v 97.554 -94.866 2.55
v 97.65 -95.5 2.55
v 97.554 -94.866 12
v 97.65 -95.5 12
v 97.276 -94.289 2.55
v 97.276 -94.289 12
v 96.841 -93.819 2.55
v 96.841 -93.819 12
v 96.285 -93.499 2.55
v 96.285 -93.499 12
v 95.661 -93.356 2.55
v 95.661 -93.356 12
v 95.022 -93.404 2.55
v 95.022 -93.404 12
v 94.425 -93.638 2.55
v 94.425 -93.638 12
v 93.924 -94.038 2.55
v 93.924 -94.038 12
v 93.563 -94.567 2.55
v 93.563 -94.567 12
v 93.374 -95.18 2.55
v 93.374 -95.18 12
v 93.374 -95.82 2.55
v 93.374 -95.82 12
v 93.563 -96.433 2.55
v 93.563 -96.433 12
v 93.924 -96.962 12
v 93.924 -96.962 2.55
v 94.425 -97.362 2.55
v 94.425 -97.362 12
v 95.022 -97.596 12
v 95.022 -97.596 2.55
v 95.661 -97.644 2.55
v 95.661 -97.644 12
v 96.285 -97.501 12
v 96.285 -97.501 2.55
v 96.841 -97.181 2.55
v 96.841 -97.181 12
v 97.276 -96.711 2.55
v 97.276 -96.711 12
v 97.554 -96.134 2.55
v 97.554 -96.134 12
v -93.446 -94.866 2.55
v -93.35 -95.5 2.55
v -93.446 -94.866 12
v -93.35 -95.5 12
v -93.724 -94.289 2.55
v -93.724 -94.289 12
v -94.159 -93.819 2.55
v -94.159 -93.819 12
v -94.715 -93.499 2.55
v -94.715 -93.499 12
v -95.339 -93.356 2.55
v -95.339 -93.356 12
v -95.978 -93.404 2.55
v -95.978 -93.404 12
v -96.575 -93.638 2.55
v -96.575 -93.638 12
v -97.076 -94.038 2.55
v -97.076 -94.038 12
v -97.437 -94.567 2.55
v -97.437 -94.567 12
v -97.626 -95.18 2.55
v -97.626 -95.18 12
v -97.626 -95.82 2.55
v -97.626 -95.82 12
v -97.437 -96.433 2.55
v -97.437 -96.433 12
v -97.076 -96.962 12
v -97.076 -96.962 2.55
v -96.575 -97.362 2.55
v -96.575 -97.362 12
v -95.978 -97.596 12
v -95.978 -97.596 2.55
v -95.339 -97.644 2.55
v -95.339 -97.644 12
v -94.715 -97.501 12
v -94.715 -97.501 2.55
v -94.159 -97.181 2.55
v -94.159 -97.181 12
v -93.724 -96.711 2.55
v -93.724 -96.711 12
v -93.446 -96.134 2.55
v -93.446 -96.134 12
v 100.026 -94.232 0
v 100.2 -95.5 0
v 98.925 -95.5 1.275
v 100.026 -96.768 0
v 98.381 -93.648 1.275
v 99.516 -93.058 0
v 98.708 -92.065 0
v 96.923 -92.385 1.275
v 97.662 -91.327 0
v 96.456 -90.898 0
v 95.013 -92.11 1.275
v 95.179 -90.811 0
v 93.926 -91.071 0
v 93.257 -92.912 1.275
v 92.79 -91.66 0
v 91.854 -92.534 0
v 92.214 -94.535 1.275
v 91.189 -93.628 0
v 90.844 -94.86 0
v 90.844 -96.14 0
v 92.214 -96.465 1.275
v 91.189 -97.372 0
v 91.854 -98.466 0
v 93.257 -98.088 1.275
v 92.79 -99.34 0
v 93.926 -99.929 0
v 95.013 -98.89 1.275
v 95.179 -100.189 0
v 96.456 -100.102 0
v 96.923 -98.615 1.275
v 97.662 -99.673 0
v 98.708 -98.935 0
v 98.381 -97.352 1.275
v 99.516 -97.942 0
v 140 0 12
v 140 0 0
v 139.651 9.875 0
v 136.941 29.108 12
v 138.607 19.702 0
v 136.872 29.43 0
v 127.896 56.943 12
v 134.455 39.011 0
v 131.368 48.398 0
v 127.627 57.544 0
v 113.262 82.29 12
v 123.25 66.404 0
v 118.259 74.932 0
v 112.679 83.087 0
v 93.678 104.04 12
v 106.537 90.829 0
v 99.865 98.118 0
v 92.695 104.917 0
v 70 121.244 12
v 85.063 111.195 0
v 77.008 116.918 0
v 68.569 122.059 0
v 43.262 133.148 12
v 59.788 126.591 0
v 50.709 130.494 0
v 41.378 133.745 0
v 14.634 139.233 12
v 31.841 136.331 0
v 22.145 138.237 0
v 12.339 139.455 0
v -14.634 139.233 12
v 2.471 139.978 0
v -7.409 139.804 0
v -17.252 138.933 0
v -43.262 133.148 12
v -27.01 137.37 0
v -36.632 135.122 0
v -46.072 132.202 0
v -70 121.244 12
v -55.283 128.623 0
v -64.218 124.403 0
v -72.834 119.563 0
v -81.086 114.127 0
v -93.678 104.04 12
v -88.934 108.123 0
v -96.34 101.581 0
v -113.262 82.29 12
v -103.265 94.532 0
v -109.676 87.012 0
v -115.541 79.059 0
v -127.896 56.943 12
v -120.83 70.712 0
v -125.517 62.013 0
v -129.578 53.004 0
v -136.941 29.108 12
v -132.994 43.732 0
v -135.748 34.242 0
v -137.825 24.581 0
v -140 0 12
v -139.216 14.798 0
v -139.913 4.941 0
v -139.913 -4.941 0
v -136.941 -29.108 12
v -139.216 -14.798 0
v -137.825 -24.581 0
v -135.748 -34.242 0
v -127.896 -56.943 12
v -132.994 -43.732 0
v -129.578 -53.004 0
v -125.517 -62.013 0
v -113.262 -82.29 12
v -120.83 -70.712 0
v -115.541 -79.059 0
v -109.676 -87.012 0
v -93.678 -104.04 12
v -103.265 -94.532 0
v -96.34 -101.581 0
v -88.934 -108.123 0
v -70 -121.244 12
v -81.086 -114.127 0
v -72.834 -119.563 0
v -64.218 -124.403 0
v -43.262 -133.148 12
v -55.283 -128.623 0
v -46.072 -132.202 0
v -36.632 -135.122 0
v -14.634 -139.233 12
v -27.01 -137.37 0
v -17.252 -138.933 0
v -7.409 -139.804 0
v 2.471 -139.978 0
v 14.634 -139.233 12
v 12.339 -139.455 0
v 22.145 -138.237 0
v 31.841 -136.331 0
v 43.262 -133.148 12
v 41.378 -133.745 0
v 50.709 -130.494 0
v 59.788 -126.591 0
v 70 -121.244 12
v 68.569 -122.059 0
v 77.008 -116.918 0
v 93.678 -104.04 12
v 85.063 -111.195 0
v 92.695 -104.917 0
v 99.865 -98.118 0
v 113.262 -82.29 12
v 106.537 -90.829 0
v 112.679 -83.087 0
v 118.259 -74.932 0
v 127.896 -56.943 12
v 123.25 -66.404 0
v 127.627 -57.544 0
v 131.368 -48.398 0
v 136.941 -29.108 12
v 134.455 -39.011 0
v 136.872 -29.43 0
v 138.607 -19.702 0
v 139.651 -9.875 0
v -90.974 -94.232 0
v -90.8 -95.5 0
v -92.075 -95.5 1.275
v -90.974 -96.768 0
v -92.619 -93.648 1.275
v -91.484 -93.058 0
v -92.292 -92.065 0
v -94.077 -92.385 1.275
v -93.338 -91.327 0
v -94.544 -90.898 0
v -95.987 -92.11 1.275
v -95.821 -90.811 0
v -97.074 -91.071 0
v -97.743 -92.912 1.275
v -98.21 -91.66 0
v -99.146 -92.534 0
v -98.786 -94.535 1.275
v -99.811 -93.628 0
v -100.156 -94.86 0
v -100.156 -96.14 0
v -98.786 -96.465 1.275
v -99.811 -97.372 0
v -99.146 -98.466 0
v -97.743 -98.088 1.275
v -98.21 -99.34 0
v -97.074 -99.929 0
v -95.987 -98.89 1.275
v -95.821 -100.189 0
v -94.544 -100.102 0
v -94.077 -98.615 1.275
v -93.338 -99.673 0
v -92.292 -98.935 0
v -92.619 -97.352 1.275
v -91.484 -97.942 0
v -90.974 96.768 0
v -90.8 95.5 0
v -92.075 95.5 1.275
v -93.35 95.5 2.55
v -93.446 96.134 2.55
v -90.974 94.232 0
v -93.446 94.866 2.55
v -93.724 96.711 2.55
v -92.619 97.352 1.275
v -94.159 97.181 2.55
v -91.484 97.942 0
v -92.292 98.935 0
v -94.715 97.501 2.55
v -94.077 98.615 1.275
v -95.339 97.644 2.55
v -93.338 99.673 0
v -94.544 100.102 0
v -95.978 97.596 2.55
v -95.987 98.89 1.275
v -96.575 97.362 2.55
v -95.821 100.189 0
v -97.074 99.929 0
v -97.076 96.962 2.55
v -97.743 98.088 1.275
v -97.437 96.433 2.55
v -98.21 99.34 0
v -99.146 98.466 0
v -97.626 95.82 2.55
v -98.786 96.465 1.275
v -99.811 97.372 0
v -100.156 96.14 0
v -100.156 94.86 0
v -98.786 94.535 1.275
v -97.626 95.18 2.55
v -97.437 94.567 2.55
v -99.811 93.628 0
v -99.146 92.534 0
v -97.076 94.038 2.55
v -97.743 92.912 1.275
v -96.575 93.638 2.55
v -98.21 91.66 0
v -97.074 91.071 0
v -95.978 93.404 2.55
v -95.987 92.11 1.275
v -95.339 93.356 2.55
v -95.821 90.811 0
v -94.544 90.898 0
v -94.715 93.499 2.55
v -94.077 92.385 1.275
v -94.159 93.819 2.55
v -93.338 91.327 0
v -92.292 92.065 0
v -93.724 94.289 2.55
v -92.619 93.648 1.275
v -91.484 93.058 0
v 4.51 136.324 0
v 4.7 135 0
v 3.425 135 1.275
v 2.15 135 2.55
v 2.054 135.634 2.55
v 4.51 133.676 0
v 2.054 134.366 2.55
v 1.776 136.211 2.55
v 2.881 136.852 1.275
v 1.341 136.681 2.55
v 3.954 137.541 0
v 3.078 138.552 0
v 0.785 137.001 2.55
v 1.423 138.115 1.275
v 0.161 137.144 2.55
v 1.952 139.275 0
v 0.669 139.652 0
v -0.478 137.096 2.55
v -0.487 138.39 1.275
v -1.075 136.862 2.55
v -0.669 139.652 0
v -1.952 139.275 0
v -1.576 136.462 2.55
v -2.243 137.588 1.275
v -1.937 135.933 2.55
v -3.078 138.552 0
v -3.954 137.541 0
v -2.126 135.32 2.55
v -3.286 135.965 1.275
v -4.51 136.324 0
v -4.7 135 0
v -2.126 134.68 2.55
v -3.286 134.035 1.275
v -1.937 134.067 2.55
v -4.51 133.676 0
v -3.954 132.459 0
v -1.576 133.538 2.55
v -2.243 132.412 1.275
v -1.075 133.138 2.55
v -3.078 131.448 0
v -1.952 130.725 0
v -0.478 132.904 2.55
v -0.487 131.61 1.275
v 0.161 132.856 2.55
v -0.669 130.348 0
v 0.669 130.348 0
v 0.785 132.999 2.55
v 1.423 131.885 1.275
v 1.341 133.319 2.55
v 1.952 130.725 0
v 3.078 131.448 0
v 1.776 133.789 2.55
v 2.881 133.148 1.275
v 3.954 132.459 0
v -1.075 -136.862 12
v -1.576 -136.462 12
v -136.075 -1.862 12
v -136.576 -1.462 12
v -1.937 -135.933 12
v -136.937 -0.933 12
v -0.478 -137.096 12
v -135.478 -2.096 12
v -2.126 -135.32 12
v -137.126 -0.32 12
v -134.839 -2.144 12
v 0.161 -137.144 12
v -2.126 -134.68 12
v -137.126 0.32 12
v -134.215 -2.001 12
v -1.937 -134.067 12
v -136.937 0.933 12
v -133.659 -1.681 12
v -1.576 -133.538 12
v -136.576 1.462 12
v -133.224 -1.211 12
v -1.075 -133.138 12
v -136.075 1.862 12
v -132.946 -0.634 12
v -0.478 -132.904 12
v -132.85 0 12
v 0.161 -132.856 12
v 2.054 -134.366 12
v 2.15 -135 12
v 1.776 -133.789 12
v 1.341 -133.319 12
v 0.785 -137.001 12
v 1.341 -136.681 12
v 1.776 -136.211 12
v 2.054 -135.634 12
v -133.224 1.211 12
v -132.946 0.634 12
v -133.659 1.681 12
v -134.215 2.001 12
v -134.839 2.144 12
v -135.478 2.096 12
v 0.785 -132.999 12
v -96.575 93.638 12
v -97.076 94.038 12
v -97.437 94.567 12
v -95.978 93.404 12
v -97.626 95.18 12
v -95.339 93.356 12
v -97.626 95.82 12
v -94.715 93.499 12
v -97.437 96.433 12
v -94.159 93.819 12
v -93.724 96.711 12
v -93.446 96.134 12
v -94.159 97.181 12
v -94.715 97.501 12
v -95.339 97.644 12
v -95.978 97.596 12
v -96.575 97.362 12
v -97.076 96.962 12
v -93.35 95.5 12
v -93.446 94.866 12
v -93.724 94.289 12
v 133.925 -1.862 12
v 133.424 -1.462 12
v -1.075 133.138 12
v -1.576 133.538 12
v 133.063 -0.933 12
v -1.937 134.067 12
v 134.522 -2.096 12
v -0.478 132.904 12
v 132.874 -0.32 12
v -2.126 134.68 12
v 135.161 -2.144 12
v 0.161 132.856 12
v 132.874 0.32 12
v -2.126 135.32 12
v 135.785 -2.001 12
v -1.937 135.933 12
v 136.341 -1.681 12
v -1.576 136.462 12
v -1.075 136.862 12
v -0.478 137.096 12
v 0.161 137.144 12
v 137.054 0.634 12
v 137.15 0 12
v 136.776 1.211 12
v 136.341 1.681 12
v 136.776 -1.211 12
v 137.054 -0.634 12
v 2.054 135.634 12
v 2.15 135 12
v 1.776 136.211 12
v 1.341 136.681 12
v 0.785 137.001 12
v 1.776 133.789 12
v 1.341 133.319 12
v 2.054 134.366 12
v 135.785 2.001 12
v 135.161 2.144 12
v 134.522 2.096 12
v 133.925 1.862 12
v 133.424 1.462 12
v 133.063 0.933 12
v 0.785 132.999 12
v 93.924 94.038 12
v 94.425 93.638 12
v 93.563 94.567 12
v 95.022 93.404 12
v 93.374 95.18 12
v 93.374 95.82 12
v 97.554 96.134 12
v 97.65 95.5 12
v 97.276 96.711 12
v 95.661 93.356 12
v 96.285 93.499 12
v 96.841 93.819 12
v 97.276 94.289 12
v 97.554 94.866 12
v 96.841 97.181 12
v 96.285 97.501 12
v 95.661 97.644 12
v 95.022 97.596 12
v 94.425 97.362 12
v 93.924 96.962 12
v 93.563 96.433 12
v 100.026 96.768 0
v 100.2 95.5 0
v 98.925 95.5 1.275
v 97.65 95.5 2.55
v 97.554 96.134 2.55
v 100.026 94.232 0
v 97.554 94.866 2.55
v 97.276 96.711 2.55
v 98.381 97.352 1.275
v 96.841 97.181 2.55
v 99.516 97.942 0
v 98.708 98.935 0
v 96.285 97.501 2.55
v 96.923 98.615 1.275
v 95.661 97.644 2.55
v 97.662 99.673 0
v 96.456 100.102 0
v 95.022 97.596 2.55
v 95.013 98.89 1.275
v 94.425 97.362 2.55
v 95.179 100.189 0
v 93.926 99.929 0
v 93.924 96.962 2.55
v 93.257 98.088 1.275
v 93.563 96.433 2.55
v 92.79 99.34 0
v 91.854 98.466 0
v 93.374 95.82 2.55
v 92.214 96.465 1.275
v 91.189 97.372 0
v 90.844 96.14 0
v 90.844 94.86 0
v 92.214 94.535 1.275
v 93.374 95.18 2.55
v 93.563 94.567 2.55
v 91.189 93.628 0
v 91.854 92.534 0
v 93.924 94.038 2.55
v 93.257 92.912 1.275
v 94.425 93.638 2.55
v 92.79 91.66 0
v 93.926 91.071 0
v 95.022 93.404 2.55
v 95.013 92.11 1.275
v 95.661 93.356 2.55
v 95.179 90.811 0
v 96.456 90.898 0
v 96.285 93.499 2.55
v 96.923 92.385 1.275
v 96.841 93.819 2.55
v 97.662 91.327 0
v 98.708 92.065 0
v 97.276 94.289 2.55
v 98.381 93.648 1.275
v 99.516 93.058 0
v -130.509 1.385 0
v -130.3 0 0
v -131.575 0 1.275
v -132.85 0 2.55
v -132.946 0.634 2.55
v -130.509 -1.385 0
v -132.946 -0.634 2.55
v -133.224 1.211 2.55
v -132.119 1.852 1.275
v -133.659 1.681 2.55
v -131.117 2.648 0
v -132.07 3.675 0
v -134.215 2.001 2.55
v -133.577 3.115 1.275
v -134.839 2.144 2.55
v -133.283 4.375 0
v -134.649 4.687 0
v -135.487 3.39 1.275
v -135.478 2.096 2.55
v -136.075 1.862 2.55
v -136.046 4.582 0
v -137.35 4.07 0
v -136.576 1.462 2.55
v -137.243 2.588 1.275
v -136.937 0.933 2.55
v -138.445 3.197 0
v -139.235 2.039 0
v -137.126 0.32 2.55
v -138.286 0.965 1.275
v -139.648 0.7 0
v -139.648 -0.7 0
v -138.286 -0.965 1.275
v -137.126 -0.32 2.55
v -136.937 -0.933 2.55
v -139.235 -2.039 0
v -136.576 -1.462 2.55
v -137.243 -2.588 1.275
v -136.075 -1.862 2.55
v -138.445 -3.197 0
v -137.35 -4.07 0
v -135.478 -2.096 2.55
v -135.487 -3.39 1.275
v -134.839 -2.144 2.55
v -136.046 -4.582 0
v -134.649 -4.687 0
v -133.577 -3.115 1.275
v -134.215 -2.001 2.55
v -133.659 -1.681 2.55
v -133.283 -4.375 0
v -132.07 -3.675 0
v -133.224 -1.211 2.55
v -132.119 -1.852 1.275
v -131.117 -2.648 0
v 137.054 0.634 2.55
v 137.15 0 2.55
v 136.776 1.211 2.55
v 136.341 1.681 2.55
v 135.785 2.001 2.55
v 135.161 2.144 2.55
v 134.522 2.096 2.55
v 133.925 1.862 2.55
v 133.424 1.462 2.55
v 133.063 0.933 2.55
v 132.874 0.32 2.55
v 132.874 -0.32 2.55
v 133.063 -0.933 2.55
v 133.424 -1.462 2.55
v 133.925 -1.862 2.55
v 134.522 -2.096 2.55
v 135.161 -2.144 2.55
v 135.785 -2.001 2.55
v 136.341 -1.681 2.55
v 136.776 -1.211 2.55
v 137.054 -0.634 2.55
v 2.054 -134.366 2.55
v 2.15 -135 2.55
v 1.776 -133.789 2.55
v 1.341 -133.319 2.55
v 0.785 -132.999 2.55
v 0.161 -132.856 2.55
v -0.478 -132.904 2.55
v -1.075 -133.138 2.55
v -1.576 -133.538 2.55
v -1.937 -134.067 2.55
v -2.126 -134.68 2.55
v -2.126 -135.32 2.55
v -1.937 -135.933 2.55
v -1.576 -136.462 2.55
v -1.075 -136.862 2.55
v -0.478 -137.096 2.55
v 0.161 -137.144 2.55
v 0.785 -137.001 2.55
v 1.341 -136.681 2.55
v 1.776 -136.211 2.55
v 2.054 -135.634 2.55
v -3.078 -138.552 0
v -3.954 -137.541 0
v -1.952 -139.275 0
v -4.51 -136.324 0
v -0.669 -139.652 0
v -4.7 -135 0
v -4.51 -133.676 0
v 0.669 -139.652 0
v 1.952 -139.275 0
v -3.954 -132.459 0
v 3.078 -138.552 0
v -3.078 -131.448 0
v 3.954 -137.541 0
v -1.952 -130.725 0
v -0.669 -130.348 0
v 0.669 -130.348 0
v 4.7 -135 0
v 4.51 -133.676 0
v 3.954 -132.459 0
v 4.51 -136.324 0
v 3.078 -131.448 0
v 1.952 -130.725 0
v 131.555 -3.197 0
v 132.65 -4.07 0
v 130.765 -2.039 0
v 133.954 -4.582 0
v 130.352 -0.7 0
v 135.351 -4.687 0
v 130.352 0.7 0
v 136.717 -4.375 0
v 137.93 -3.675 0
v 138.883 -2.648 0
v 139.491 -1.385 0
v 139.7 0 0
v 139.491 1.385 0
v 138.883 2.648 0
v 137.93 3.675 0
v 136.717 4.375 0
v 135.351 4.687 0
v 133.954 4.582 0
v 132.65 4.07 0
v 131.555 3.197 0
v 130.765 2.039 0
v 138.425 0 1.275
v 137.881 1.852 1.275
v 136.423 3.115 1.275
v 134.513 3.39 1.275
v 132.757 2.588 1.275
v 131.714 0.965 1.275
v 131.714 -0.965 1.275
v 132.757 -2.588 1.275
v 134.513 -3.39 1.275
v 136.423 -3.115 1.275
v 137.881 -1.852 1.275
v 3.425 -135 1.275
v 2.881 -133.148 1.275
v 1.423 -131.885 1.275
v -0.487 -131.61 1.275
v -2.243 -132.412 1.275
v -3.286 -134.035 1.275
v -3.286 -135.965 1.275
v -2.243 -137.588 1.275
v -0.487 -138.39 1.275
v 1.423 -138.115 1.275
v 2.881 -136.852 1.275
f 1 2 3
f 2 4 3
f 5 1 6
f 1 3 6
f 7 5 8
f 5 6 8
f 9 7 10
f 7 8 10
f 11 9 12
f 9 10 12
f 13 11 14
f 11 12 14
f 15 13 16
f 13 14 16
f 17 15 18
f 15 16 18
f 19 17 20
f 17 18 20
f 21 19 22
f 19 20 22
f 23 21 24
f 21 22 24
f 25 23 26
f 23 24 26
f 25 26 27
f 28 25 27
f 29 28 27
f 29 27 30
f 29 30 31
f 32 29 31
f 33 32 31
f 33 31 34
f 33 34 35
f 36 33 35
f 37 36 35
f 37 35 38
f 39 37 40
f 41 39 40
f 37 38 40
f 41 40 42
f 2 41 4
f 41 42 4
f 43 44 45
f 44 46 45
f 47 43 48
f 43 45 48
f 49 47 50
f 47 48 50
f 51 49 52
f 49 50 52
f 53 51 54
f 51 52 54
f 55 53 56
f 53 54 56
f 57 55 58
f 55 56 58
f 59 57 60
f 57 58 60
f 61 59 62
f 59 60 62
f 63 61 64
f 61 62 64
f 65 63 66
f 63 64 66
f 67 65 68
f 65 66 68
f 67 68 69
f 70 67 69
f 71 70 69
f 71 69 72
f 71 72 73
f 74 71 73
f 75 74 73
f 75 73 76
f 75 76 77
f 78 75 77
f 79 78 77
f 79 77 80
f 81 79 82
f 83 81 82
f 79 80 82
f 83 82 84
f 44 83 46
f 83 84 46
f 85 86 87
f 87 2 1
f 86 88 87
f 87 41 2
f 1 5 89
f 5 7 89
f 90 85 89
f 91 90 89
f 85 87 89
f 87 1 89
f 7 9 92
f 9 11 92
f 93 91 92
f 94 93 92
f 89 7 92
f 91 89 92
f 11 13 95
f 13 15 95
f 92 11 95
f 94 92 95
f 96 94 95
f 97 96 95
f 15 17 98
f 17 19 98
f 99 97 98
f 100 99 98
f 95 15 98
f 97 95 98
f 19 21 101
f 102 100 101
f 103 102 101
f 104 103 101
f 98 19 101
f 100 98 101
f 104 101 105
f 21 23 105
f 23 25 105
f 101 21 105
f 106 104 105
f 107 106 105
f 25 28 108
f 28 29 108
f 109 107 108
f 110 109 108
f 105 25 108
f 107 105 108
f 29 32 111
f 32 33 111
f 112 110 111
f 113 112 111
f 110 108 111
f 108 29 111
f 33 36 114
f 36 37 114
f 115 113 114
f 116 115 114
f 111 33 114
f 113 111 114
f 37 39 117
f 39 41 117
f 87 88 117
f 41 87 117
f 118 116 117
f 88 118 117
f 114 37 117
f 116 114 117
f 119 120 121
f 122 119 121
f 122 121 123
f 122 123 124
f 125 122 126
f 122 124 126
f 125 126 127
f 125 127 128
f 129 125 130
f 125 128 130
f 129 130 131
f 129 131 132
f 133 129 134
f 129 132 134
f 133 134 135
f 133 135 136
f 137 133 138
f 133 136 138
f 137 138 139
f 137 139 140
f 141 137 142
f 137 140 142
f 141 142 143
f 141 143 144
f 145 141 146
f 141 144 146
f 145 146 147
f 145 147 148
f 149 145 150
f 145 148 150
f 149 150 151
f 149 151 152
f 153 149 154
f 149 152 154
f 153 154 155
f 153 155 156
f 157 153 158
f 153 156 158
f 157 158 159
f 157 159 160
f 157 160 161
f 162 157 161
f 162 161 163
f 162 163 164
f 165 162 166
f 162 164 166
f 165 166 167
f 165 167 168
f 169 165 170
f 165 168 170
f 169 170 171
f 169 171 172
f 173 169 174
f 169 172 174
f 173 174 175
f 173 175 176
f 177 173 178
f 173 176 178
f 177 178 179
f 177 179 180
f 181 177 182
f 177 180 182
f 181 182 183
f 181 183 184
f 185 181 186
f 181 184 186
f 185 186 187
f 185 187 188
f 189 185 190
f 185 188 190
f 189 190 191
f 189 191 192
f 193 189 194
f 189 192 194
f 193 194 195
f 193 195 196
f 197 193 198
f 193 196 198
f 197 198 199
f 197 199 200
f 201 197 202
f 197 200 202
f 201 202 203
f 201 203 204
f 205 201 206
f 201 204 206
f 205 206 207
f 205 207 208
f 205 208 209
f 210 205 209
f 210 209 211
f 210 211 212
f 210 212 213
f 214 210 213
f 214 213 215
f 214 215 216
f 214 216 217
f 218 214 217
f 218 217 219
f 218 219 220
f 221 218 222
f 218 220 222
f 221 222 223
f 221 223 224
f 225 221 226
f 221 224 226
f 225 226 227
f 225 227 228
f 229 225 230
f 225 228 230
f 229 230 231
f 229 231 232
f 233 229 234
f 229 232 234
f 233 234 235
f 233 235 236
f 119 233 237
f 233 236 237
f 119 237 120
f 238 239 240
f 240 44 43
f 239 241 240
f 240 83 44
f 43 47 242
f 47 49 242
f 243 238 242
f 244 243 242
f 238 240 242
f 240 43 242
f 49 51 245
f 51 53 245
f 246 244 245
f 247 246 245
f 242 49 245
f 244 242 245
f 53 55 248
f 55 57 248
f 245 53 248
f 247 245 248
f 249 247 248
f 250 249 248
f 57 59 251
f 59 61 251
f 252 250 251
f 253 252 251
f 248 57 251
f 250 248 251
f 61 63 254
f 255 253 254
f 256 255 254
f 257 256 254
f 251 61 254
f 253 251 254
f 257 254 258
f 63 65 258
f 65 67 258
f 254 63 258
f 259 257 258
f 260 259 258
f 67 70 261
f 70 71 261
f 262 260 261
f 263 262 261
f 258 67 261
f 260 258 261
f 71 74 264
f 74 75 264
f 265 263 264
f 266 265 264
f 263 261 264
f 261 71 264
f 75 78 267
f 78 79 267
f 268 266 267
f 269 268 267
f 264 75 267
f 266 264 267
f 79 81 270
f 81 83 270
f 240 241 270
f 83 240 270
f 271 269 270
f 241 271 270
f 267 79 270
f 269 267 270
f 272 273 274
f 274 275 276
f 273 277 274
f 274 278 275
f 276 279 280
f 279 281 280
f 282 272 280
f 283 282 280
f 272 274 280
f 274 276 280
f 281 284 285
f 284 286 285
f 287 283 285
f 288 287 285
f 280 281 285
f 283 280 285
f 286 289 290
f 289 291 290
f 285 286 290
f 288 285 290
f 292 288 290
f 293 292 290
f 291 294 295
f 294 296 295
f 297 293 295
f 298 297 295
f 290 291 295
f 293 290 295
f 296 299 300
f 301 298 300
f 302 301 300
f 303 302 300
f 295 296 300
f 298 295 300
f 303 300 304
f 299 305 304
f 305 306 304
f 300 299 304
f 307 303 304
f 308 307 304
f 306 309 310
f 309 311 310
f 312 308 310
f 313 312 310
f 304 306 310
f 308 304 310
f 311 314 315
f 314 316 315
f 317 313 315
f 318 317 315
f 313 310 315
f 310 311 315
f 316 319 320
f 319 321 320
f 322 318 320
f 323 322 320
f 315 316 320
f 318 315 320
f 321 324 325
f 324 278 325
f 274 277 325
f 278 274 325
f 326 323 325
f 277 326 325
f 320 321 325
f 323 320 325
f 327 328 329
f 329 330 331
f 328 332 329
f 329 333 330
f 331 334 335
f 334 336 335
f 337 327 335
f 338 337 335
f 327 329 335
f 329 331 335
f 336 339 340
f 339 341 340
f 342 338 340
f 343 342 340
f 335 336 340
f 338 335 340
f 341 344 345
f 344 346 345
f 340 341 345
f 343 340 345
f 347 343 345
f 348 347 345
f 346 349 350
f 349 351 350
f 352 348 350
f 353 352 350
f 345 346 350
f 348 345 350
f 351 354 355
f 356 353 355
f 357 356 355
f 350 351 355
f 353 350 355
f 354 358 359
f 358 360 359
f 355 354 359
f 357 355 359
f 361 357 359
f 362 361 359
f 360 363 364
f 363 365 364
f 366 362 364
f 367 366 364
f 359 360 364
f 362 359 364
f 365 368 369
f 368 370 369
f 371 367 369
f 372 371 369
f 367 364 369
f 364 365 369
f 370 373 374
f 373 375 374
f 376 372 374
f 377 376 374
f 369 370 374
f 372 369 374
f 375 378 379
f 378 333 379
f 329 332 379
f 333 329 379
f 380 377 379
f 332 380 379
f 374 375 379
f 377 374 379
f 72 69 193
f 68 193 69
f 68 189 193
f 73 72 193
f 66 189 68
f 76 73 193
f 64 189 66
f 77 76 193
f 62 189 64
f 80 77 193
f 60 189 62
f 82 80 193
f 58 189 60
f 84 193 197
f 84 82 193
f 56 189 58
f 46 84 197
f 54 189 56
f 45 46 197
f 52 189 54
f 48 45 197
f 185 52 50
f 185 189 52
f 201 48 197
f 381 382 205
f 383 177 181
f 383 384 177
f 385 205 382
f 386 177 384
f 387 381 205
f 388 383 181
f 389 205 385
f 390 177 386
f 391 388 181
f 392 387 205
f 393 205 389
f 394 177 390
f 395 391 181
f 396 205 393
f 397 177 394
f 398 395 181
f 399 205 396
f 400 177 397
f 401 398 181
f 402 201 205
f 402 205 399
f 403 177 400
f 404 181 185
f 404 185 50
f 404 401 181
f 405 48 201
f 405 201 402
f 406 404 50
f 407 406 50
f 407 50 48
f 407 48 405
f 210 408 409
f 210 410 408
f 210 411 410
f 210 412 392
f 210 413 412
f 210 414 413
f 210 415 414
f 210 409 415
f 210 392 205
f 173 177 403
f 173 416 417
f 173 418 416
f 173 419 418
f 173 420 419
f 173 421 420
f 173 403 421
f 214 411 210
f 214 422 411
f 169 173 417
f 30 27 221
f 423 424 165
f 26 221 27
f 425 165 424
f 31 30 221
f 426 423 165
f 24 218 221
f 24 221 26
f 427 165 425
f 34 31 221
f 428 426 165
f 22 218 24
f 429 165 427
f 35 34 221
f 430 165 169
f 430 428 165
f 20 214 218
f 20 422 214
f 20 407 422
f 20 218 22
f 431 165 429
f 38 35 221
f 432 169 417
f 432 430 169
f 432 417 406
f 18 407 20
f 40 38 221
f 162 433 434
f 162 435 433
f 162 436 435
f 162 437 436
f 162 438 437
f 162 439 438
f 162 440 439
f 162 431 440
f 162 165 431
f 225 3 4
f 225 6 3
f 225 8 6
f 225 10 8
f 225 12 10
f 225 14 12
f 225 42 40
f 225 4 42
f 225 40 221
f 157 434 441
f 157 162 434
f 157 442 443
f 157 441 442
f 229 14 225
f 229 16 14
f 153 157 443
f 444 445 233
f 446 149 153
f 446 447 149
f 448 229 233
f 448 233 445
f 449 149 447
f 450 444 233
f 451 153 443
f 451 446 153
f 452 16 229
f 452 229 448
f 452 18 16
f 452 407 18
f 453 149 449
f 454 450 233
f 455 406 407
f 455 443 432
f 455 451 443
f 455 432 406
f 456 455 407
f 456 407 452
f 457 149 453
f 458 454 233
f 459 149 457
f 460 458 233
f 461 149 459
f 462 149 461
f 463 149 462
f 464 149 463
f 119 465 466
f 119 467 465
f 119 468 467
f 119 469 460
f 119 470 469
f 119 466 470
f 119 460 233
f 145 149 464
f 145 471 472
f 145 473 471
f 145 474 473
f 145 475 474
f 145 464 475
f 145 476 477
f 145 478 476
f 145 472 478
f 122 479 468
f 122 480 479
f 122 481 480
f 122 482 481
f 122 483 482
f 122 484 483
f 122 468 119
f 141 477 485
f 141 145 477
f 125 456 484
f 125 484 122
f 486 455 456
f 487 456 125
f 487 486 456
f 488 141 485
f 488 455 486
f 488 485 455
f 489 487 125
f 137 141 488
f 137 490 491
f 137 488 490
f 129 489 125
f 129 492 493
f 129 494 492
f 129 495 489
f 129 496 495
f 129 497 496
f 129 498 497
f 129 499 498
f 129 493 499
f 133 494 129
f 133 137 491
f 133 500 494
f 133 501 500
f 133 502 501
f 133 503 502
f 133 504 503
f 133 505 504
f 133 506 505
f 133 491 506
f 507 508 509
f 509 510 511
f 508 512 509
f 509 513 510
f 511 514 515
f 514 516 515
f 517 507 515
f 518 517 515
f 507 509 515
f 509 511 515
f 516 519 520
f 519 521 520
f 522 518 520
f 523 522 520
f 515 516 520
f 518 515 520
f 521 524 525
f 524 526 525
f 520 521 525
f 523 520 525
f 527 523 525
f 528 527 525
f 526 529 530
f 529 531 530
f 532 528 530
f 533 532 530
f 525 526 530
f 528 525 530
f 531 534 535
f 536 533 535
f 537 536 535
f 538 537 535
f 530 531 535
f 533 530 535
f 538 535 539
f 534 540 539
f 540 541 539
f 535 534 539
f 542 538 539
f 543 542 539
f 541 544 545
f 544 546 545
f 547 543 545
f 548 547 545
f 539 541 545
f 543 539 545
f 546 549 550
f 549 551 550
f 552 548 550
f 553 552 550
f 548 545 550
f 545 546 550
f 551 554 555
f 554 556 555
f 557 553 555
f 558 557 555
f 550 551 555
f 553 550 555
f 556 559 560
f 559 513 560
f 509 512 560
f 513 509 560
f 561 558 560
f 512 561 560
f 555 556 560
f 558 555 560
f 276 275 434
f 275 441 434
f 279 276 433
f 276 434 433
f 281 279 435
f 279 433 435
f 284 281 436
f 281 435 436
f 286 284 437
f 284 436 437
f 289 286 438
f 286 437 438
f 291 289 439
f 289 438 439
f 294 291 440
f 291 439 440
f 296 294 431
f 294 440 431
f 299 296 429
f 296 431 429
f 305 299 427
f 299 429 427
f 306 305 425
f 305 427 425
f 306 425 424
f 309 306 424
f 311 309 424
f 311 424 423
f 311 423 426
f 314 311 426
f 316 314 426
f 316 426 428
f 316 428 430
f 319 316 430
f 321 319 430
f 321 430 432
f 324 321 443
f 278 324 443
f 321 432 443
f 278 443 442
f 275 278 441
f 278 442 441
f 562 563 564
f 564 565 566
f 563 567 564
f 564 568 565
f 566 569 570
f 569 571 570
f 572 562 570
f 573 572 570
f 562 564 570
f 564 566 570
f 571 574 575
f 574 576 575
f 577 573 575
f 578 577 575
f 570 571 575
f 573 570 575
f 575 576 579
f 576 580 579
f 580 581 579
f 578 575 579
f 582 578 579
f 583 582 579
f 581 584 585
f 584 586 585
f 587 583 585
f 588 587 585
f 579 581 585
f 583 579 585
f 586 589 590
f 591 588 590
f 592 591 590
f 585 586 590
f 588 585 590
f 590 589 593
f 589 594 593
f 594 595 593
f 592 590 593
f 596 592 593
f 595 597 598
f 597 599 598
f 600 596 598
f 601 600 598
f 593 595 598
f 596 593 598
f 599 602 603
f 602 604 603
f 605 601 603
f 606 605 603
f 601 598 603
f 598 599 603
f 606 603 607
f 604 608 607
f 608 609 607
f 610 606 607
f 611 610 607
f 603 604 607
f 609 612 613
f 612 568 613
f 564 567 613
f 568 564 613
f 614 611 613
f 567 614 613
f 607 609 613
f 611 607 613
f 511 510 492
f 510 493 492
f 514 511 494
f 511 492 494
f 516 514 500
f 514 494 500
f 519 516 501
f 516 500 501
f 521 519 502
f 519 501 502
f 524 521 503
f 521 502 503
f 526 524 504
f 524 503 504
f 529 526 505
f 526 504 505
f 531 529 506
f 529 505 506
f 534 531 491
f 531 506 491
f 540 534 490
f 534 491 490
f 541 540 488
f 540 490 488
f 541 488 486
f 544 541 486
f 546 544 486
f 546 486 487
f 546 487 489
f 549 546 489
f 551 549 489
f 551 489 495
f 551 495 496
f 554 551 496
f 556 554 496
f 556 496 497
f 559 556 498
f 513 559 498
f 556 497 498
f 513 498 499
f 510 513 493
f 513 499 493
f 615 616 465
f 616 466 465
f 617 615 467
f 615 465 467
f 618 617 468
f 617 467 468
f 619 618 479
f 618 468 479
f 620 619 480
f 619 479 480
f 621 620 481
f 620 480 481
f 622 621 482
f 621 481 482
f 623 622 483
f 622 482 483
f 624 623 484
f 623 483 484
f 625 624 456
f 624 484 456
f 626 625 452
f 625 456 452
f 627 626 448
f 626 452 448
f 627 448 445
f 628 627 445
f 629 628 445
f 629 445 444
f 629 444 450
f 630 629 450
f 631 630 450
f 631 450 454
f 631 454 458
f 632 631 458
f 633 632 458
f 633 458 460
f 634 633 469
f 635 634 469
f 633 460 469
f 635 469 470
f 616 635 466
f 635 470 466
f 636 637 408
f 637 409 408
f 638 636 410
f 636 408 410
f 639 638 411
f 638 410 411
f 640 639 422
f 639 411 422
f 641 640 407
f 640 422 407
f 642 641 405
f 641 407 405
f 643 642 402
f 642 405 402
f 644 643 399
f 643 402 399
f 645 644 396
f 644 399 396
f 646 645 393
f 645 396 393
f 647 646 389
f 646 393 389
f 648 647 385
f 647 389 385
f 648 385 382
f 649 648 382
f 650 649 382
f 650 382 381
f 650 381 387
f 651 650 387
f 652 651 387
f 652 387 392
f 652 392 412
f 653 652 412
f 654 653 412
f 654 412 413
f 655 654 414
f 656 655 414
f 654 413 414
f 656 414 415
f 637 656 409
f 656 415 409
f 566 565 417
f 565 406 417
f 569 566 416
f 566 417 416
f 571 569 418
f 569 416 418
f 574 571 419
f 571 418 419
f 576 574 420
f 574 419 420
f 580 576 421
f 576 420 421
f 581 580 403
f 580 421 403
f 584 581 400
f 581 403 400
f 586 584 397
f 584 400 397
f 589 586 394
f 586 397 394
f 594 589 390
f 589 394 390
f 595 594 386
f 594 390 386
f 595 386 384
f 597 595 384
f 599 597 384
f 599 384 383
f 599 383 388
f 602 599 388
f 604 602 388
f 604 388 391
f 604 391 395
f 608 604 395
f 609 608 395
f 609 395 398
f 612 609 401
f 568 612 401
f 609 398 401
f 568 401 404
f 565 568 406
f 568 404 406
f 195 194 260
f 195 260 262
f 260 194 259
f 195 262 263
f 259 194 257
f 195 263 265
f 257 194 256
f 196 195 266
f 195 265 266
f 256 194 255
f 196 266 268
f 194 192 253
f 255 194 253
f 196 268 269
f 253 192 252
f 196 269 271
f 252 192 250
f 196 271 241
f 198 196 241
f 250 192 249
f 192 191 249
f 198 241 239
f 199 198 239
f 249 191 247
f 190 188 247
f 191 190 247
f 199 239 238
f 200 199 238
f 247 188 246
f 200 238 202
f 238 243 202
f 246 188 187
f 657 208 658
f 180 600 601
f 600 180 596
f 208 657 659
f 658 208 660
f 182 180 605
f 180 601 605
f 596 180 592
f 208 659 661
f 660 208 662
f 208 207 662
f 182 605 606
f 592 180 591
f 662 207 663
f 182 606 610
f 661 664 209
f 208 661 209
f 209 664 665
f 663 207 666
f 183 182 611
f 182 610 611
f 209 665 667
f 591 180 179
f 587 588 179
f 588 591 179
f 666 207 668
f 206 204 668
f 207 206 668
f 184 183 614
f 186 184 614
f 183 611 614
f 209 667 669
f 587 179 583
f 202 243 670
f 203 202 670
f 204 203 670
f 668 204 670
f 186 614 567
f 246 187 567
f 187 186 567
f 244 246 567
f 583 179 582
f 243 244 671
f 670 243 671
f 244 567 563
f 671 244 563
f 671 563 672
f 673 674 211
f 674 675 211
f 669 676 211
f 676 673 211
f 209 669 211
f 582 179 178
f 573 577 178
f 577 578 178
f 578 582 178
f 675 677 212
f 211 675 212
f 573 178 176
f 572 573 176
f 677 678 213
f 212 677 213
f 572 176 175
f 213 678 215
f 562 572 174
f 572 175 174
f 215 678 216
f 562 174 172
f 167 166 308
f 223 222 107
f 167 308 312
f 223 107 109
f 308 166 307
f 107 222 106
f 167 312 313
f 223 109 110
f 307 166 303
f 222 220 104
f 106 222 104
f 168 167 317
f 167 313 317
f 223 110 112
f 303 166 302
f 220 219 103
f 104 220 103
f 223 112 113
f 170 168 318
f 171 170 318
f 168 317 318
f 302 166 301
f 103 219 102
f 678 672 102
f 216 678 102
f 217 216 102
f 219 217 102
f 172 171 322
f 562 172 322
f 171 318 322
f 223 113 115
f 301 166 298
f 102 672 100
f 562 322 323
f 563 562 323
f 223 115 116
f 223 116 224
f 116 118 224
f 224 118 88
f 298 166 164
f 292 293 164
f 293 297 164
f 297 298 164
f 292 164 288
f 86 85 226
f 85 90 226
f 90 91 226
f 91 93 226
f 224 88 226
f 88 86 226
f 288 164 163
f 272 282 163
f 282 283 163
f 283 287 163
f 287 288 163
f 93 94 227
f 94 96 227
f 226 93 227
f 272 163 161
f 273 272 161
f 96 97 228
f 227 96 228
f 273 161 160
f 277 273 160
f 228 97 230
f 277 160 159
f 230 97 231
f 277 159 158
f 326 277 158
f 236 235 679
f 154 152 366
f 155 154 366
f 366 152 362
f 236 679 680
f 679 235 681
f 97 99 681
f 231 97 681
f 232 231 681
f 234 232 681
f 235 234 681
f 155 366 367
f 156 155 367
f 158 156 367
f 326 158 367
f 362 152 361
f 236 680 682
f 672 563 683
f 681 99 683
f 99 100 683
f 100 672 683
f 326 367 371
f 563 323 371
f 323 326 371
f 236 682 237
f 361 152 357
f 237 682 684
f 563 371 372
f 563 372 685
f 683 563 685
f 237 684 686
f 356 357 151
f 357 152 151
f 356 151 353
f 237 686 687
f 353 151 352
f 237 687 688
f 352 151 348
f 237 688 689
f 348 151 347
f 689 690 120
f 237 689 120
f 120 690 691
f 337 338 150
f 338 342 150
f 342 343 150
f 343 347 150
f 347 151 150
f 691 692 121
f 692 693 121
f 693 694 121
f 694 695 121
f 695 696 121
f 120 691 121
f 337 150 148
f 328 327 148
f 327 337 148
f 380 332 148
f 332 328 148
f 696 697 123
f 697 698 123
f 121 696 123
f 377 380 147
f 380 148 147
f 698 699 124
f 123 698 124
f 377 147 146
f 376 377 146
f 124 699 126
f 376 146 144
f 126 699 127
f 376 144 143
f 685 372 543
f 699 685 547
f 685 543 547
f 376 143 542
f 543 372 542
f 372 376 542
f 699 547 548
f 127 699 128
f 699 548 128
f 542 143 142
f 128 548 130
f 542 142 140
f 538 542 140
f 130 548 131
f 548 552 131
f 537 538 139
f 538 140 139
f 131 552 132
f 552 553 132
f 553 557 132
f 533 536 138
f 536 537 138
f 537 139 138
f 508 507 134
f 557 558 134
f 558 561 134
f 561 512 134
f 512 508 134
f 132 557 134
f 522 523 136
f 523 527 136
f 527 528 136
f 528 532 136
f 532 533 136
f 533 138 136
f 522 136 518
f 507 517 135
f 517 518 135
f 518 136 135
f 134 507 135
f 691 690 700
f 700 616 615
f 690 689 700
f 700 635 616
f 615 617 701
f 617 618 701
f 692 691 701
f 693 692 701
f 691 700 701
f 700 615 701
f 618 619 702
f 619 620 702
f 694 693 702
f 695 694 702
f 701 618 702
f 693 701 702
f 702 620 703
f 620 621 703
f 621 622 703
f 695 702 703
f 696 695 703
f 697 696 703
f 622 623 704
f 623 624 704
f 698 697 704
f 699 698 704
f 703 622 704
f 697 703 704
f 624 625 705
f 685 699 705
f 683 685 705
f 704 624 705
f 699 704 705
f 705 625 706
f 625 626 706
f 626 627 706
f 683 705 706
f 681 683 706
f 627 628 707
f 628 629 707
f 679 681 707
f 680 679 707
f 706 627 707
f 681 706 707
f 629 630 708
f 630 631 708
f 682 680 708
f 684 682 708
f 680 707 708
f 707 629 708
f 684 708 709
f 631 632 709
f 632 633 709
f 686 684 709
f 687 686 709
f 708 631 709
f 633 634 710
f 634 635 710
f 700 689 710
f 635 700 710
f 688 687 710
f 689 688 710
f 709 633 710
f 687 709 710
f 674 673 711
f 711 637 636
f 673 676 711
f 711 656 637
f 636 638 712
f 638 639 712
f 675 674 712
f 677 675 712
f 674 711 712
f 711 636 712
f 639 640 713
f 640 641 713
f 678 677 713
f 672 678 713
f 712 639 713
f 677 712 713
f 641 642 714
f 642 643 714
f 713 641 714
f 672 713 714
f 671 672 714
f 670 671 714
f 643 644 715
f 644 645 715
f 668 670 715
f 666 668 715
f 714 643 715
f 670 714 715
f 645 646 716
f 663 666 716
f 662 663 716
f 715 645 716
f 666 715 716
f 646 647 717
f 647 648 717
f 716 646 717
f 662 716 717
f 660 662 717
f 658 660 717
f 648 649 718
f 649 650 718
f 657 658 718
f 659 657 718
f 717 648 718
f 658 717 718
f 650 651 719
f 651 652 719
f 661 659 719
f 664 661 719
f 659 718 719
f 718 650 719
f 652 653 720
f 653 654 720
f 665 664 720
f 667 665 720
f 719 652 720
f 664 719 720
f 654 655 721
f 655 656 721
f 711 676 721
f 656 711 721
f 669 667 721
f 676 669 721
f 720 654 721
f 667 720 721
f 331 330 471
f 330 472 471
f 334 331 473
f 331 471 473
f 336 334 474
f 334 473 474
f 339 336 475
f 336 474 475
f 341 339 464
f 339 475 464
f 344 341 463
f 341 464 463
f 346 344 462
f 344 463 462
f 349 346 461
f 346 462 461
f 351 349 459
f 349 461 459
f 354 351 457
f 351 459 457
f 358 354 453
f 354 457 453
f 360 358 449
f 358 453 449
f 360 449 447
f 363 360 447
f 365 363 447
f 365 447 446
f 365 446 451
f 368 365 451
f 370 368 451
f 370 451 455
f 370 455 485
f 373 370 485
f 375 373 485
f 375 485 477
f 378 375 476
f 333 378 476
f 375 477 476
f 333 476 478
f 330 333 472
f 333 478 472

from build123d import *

# Parameters (mm, degrees)
SKETCH1_R                                       = 140
BOSS_EXTRUDE1_DEPTH                             = 12
CSK_FOR_M4_FLAT_HEAD_MACHINE_SCREW1_D           = 4.3
CSK_FOR_M4_FLAT_HEAD_MACHINE_SCREW1_CSINK_D     = 9.4
CSK_FOR_M4_FLAT_HEAD_MACHINE_SCREW1_CSINK_ANGLE = 90


with BuildPart() as part:
    # Sketch1 → Boss-Extrude1 (new body)
    with BuildSketch(Plane.XY):
        Circle(SKETCH1_R)
    extrude(amount=BOSS_EXTRUDE1_DEPTH)

    # CSK for M4 Flat Head Machine Screw1 (through all)
    with Locations(Plane(origin=(0, 0, 0), x_dir=(-1, 0, 0), z_dir=(0, 0, -1))):
        with Locations((0, 135), (135, 0), (0, -135), (-135, 0), (-95.5, 95.5), (95.5, 95.5), (95.5, -95.5), (-95.5, -95.5)):
            CounterSinkHole(CSK_FOR_M4_FLAT_HEAD_MACHINE_SCREW1_D / 2, CSK_FOR_M4_FLAT_HEAD_MACHINE_SCREW1_CSINK_D / 2, counter_sink_angle=CSK_FOR_M4_FLAT_HEAD_MACHINE_SCREW1_CSINK_ANGLE)


solid = part.part
